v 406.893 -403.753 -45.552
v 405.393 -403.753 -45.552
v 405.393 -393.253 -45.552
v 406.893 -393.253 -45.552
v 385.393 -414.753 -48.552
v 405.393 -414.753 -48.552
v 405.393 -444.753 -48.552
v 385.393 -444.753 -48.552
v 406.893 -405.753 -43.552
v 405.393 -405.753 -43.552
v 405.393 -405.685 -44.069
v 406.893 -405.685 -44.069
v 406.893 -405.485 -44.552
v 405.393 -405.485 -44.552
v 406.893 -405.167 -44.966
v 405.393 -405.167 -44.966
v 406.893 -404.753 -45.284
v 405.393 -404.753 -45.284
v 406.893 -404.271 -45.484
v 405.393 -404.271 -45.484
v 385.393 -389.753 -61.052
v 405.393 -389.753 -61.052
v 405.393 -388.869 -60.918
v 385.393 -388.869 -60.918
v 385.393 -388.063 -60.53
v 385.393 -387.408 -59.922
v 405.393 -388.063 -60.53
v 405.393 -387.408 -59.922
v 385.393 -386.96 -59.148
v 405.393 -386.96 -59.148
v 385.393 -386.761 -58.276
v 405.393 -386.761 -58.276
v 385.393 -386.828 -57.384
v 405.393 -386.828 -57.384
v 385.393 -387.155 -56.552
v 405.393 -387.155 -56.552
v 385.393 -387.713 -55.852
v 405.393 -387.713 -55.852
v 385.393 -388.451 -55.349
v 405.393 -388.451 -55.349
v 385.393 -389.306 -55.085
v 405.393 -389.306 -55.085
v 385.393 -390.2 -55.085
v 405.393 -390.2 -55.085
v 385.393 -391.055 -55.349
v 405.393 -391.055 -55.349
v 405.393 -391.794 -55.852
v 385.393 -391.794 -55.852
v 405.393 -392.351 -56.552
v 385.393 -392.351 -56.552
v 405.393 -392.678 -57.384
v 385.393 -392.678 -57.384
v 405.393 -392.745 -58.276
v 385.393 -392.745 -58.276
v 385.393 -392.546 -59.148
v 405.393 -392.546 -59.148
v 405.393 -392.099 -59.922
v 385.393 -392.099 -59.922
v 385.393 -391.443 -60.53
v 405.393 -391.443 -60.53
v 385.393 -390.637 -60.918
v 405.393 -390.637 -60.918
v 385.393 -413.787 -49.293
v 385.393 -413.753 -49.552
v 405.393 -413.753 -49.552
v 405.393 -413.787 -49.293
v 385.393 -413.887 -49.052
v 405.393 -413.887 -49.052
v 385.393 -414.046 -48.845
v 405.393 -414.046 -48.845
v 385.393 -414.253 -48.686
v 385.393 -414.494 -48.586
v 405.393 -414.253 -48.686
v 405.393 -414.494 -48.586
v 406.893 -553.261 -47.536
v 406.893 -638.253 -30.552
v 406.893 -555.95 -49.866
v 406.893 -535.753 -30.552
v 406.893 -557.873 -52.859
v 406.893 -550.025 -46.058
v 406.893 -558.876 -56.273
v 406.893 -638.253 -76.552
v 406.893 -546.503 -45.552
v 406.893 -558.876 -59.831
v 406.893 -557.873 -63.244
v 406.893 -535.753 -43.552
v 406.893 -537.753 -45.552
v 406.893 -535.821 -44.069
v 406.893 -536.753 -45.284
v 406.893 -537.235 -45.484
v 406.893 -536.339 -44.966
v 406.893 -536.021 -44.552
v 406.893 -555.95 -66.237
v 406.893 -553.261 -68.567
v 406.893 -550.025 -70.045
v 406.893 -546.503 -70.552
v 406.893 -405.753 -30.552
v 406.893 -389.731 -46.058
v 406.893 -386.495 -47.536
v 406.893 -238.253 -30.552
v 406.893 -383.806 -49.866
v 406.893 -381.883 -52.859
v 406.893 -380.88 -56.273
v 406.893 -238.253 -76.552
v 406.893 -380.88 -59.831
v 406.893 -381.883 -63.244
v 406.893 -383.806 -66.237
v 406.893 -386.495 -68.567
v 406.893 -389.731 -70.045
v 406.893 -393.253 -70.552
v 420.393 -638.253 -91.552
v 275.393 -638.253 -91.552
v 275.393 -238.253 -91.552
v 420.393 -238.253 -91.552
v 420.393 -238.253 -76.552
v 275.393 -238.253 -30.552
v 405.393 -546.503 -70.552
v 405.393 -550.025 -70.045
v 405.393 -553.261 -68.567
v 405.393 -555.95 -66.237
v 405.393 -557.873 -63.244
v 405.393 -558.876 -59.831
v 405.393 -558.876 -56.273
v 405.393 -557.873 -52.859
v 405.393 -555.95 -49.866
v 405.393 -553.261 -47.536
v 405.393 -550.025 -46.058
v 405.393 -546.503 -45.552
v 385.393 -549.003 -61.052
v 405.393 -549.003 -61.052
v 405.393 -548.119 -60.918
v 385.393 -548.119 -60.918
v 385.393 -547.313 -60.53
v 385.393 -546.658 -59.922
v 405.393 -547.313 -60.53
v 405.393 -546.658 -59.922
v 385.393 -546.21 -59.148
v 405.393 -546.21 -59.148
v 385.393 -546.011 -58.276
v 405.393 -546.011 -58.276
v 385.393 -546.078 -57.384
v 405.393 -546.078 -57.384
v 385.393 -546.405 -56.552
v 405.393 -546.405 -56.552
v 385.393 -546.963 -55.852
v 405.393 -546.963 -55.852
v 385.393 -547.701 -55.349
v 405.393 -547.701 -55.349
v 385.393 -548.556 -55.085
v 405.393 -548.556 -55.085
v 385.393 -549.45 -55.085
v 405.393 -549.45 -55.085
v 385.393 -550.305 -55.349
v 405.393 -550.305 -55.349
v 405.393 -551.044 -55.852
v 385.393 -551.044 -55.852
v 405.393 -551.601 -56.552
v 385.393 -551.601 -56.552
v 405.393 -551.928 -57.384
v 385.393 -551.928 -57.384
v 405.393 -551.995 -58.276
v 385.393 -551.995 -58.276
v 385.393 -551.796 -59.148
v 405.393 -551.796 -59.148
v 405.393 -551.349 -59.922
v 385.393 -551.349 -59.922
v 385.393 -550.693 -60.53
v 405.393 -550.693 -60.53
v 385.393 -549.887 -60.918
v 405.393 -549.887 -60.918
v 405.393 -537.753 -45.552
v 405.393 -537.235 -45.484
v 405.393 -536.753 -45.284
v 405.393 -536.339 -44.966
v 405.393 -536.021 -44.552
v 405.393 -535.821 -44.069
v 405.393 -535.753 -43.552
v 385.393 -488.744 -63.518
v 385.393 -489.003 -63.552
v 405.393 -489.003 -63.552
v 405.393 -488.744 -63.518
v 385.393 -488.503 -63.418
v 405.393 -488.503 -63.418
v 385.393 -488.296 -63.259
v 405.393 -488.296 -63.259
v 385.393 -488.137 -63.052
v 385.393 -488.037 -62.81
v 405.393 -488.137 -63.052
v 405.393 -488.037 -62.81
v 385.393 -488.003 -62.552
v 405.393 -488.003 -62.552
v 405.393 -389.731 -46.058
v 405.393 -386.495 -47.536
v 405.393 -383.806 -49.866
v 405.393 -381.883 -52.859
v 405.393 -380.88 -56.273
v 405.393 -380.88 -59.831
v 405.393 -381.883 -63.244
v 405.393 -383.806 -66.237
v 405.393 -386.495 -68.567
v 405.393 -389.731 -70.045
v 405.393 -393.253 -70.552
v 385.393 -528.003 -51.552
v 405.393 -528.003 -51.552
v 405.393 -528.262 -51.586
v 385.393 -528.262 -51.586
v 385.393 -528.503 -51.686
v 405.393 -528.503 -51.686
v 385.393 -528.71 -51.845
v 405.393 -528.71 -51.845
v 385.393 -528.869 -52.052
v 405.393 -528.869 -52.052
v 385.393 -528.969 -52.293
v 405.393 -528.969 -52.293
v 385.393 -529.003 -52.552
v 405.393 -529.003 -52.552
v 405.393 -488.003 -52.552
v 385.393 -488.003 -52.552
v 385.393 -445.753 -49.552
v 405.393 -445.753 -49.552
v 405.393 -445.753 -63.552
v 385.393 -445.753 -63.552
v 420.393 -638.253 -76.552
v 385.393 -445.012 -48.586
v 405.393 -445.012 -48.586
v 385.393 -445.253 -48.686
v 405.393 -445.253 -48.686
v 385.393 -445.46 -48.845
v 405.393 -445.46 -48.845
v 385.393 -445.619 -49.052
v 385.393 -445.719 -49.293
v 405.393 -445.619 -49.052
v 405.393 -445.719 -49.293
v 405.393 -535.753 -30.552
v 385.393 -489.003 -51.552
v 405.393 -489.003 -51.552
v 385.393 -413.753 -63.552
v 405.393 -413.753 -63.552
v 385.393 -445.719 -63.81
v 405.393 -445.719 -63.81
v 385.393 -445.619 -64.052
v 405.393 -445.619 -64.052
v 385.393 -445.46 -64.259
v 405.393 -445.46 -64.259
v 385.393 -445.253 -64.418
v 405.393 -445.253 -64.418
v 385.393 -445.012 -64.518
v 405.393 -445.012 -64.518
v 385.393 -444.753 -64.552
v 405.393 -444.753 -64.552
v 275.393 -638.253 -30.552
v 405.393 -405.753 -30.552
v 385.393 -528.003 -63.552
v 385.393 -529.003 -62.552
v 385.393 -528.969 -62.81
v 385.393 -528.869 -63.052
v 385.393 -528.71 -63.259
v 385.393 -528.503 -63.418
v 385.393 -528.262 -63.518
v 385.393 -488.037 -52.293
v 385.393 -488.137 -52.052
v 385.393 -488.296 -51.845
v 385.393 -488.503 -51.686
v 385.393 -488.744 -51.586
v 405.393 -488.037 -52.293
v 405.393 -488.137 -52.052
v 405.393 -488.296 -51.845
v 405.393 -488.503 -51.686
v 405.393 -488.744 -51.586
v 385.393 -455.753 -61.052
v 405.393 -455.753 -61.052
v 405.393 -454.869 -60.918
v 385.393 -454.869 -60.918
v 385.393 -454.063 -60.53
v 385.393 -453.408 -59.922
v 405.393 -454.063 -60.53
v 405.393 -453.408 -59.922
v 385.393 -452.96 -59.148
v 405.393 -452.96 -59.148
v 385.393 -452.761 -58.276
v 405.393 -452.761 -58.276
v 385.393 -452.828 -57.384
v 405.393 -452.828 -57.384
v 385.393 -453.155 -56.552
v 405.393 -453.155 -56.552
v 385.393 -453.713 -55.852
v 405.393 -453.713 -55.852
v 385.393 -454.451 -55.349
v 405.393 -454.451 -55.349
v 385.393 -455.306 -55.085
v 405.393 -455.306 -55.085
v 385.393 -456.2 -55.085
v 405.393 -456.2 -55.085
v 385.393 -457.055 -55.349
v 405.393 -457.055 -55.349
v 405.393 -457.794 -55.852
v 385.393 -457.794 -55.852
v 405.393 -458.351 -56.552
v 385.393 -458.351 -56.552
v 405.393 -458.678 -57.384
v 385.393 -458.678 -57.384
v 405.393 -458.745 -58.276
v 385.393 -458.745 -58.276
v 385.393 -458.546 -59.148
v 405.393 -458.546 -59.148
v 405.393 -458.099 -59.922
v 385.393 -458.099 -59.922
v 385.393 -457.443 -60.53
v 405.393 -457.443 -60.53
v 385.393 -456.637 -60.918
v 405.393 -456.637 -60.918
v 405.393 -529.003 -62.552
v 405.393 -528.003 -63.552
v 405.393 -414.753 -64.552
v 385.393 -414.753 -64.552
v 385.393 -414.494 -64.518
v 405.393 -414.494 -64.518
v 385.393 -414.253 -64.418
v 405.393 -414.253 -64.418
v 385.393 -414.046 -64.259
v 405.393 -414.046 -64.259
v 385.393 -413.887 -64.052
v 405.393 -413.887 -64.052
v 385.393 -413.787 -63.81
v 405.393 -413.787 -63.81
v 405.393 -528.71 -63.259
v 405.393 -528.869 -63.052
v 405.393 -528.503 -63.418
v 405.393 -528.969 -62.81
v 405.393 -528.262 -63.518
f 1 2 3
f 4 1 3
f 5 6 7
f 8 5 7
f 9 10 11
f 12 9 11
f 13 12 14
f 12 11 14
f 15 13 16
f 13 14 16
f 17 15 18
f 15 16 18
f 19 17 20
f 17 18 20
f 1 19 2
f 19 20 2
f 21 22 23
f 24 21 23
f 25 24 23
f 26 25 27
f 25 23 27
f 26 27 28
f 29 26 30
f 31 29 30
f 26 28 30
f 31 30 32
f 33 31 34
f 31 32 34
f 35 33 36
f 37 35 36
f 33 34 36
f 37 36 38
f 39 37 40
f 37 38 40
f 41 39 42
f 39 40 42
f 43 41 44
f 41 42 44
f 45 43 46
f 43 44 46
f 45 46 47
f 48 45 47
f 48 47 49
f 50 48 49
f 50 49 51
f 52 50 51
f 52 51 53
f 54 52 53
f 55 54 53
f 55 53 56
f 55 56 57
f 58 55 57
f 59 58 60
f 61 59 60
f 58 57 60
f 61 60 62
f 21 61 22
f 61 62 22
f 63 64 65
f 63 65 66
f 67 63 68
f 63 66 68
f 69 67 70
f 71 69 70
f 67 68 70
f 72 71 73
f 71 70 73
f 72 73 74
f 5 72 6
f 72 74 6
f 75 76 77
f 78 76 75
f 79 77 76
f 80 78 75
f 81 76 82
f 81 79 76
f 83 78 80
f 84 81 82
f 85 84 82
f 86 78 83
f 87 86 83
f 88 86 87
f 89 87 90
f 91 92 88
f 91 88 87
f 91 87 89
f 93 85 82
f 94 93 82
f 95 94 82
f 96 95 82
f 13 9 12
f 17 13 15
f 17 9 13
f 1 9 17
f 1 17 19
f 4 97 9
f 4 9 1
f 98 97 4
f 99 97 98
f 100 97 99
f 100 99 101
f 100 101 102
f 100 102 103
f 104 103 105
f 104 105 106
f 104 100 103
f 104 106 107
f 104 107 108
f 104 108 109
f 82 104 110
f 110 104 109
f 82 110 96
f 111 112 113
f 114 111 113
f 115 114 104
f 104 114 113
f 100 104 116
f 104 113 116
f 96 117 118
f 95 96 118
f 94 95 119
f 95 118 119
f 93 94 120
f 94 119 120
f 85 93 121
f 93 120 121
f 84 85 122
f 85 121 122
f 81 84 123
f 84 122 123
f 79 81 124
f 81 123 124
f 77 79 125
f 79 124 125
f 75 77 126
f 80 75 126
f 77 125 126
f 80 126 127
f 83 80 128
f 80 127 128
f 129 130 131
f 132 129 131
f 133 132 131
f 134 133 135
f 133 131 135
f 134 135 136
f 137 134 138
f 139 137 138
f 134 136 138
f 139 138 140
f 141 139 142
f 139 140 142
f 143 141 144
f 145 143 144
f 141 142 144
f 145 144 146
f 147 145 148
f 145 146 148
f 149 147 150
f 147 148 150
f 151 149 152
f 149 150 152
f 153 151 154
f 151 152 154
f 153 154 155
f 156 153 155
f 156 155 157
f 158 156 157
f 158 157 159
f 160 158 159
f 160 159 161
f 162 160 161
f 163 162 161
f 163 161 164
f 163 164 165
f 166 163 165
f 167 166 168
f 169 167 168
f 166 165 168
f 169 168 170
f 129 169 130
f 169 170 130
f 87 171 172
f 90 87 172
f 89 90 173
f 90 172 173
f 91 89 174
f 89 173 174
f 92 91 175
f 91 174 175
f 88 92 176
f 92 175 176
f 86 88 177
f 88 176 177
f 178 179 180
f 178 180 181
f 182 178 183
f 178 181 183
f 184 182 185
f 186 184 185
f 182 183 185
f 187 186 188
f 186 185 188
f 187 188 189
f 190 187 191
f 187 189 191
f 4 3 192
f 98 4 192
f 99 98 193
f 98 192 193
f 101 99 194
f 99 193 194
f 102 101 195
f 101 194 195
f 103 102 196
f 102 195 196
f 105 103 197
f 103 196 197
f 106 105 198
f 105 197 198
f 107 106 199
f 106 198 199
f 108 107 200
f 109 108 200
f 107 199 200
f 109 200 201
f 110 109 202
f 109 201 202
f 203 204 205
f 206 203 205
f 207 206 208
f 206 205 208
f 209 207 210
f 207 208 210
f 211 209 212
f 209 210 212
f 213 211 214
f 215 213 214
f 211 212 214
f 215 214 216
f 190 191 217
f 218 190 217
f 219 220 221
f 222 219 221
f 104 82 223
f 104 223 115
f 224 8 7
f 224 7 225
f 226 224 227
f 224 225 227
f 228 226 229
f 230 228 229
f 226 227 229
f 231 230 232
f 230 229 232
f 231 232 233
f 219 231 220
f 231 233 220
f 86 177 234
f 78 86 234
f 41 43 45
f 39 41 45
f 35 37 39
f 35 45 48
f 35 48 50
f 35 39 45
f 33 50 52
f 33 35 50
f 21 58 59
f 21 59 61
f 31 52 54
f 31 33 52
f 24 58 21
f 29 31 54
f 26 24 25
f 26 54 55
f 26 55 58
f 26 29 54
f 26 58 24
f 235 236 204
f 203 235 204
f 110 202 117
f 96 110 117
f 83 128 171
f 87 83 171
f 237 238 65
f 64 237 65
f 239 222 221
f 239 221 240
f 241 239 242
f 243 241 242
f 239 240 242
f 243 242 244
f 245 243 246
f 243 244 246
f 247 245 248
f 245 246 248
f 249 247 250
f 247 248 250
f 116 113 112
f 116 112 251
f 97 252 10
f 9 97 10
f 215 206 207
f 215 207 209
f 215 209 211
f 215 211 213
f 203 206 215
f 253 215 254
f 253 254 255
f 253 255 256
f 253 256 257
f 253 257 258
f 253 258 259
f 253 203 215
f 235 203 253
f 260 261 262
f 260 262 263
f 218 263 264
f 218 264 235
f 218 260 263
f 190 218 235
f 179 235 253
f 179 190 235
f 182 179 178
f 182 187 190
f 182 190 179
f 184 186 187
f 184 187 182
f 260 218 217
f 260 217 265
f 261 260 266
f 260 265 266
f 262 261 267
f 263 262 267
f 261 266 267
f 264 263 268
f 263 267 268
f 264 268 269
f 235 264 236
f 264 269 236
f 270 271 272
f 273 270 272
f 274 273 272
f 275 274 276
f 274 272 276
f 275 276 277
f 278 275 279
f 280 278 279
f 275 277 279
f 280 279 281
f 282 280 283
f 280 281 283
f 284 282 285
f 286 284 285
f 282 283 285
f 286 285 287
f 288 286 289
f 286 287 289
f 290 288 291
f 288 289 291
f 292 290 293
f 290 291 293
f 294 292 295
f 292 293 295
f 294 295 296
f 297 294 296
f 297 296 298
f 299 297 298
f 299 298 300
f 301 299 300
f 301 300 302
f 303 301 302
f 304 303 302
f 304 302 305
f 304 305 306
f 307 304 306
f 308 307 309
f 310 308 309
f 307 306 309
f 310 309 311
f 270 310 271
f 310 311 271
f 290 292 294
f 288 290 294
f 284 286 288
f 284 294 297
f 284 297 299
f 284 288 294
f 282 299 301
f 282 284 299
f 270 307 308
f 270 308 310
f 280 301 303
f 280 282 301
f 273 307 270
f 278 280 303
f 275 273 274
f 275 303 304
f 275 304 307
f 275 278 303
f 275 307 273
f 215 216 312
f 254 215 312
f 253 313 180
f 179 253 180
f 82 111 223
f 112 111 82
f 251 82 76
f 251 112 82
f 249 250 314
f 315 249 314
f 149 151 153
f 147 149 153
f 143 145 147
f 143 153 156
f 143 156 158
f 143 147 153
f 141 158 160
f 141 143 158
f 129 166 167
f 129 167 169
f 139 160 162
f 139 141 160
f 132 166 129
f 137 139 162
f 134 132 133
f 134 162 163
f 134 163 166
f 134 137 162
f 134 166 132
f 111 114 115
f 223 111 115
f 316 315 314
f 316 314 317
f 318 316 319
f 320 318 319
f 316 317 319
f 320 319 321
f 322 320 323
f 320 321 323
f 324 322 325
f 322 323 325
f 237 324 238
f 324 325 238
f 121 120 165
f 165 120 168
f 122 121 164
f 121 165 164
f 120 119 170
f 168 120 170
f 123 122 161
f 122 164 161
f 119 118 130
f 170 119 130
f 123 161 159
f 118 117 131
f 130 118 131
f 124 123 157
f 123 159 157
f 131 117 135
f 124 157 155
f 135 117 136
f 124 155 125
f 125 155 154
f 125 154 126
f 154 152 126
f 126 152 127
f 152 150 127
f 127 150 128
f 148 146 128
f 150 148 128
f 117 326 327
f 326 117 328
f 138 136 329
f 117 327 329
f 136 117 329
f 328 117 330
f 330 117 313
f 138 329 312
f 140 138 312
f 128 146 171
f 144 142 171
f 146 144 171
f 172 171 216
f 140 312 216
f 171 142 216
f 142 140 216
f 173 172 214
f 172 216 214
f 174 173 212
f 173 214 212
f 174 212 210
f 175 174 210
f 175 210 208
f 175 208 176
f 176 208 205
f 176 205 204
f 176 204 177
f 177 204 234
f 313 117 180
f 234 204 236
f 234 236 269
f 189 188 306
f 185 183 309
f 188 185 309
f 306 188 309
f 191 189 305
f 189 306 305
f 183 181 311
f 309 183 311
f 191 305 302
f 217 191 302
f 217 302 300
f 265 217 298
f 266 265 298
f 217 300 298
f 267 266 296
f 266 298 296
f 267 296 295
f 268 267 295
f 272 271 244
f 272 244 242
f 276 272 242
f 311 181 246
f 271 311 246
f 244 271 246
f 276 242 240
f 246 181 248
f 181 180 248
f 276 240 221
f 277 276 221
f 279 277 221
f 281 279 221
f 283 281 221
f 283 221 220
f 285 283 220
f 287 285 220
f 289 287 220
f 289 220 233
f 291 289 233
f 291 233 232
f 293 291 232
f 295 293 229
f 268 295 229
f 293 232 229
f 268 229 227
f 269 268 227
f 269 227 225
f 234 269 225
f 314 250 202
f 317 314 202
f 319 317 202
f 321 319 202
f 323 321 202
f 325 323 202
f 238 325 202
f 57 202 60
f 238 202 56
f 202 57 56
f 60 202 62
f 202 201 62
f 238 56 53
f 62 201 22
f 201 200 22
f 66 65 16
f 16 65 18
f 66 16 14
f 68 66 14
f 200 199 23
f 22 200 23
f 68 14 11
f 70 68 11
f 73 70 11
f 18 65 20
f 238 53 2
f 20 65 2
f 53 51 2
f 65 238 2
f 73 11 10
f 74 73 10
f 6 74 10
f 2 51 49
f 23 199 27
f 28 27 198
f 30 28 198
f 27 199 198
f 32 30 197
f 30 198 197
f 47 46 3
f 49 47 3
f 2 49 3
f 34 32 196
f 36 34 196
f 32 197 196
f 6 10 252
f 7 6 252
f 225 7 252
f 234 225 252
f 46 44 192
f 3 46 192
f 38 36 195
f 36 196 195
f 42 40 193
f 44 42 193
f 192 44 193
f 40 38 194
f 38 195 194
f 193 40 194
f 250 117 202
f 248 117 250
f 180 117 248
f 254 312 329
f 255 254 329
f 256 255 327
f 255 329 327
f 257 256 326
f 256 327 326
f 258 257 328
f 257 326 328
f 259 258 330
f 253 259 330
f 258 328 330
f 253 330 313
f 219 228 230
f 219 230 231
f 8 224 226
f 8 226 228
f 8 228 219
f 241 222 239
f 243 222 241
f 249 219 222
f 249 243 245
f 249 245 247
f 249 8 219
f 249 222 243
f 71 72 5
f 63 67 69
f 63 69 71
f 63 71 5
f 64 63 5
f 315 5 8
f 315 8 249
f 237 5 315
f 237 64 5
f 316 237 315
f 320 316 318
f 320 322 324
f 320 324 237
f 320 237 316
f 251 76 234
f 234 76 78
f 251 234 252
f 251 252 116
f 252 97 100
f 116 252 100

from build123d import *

# Parameters (mm, degrees)
EXTRUSION1_DEPTH        = 1.5
ESQUISSE3_W             = 46
ESQUISSE3_H             = 400
EXTRUSION2_DEPTH        = 130
ESQUISSE4_W             = 15
ESQUISSE4_H             = 400
EXTRUSION3_DEPTH        = 145
ESQUISSE7_R             = 3
ENL_V_MAT_EXTRU_1_DEPTH = 20


with BuildPart() as part:
    # Esquisse2 → Extrusion1 (new body)
    with BuildSketch(Plane.ZY.offset(-405.393457589)):
        with BuildLine():
            Line((-30.551651131, -238.253062947), (-30.551651131, -405.753062947))
            Line((-30.551651131, -405.753062947), (-43.551651131, -405.753062947))
            ThreePointArc((-43.551651131, -405.753062947), (-44.965864693, -405.16727651), (-45.551651131, -403.753062947))
            Line((-45.551651131, -403.753062947), (-45.551651131, -393.253062947))
            ThreePointArc((-45.551651131, -393.253062947), (-58.051651131, -380.753062947), (-70.551651131, -393.253062947))
            Line((-70.551651131, -393.253062947), (-70.551651131, -546.503062947))
            ThreePointArc((-70.551651131, -546.503062947), (-58.051651131, -559.003062947), (-45.551651131, -546.503062947))
            Line((-45.551651131, -546.503062947), (-45.551651131, -537.753062947))
            ThreePointArc((-45.551651131, -537.753062947), (-44.965864693, -536.338849385), (-43.551651131, -535.753062947))
            Line((-43.551651131, -535.753062947), (-30.551651131, -535.753062947))
            Line((-30.551651131, -535.753062947), (-30.551651131, -638.253062947))
            Line((-30.551651131, -638.253062947), (-76.551651131, -638.253062947))
            Line((-76.551651131, -638.253062947), (-76.551651131, -238.253062947))
            Line((-76.551651131, -238.253062947), (-30.551651131, -238.253062947))
        make_face()
    extrude(amount=-EXTRUSION1_DEPTH)

    # Esquisse3 → Extrusion2 (add)
    with BuildSketch(Plane.ZY.offset(-405.393457589)):
        with Locations((-53.551651131, -438.253062947)):
            Rectangle(ESQUISSE3_W, ESQUISSE3_H)
    extrude(amount=EXTRUSION2_DEPTH)

    # Esquisse4 → Extrusion3 (add)
    with BuildSketch(Plane.ZY.offset(-275.393457589)):
        with Locations((-84.051651131, -438.253062947)):
            Rectangle(ESQUISSE4_W, ESQUISSE4_H)
    extrude(amount=-EXTRUSION3_DEPTH)

    # Esquisse7 → Enlèv. mat.-Extru.1 (cut)
    with BuildSketch(Plane(origin=(405.393457589, 0, 0), x_dir=(0, 0, -1), z_dir=(1, 0, 0))):
        with Locations((58.051651131, -389.753062947)):
            Circle(ESQUISSE7_R)
        with Locations((58.051651131, -455.753062947)):
            Circle(ESQUISSE7_R)
        with Locations((58.051651131, -549.003062947)):
            Circle(ESQUISSE7_R)
        with BuildLine():
            Line((48.551651131, -414.753062947), (48.551651131, -444.753062947))
            ThreePointArc((48.551651131, -444.753062947), (48.84454435, -445.460169728), (49.551651131, -445.753062947))
            Line((49.551651131, -445.753062947), (63.551651131, -445.753062947))
            ThreePointArc((63.551651131, -445.753062947), (64.258757912, -445.460169728), (64.551651131, -444.753062947))
            Line((64.551651131, -444.753062947), (64.551651131, -414.753062947))
            ThreePointArc((64.551651131, -414.753062947), (64.258757912, -414.045956166), (63.551651131, -413.753062947))
            Line((63.551651131, -413.753062947), (49.551651131, -413.753062947))
            ThreePointArc((49.551651131, -413.753062947), (48.84454435, -414.045956166), (48.551651131, -414.753062947))
        make_face()
        with BuildLine():
            Line((63.551651131, -528.003062947), (63.551651131, -489.003062947))
            ThreePointArc((63.551651131, -489.003062947), (63.258757912, -488.295956166), (62.551651131, -488.003062947))
            Line((62.551651131, -488.003062947), (52.551651131, -488.003062947))
            ThreePointArc((52.551651131, -488.003062947), (51.84454435, -488.295956166), (51.551651131, -489.003062947))
            Line((51.551651131, -489.003062947), (51.551651131, -528.003062947))
            ThreePointArc((51.551651131, -528.003062947), (51.84454435, -528.710169728), (52.551651131, -529.003062947))
            Line((52.551651131, -529.003062947), (62.551651131, -529.003062947))
            ThreePointArc((62.551651131, -529.003062947), (63.258757912, -528.710169728), (63.551651131, -528.003062947))
        make_face()
    extrude(amount=-ENL_V_MAT_EXTRU_1_DEPTH, mode=Mode.SUBTRACT)


solid = part.part
